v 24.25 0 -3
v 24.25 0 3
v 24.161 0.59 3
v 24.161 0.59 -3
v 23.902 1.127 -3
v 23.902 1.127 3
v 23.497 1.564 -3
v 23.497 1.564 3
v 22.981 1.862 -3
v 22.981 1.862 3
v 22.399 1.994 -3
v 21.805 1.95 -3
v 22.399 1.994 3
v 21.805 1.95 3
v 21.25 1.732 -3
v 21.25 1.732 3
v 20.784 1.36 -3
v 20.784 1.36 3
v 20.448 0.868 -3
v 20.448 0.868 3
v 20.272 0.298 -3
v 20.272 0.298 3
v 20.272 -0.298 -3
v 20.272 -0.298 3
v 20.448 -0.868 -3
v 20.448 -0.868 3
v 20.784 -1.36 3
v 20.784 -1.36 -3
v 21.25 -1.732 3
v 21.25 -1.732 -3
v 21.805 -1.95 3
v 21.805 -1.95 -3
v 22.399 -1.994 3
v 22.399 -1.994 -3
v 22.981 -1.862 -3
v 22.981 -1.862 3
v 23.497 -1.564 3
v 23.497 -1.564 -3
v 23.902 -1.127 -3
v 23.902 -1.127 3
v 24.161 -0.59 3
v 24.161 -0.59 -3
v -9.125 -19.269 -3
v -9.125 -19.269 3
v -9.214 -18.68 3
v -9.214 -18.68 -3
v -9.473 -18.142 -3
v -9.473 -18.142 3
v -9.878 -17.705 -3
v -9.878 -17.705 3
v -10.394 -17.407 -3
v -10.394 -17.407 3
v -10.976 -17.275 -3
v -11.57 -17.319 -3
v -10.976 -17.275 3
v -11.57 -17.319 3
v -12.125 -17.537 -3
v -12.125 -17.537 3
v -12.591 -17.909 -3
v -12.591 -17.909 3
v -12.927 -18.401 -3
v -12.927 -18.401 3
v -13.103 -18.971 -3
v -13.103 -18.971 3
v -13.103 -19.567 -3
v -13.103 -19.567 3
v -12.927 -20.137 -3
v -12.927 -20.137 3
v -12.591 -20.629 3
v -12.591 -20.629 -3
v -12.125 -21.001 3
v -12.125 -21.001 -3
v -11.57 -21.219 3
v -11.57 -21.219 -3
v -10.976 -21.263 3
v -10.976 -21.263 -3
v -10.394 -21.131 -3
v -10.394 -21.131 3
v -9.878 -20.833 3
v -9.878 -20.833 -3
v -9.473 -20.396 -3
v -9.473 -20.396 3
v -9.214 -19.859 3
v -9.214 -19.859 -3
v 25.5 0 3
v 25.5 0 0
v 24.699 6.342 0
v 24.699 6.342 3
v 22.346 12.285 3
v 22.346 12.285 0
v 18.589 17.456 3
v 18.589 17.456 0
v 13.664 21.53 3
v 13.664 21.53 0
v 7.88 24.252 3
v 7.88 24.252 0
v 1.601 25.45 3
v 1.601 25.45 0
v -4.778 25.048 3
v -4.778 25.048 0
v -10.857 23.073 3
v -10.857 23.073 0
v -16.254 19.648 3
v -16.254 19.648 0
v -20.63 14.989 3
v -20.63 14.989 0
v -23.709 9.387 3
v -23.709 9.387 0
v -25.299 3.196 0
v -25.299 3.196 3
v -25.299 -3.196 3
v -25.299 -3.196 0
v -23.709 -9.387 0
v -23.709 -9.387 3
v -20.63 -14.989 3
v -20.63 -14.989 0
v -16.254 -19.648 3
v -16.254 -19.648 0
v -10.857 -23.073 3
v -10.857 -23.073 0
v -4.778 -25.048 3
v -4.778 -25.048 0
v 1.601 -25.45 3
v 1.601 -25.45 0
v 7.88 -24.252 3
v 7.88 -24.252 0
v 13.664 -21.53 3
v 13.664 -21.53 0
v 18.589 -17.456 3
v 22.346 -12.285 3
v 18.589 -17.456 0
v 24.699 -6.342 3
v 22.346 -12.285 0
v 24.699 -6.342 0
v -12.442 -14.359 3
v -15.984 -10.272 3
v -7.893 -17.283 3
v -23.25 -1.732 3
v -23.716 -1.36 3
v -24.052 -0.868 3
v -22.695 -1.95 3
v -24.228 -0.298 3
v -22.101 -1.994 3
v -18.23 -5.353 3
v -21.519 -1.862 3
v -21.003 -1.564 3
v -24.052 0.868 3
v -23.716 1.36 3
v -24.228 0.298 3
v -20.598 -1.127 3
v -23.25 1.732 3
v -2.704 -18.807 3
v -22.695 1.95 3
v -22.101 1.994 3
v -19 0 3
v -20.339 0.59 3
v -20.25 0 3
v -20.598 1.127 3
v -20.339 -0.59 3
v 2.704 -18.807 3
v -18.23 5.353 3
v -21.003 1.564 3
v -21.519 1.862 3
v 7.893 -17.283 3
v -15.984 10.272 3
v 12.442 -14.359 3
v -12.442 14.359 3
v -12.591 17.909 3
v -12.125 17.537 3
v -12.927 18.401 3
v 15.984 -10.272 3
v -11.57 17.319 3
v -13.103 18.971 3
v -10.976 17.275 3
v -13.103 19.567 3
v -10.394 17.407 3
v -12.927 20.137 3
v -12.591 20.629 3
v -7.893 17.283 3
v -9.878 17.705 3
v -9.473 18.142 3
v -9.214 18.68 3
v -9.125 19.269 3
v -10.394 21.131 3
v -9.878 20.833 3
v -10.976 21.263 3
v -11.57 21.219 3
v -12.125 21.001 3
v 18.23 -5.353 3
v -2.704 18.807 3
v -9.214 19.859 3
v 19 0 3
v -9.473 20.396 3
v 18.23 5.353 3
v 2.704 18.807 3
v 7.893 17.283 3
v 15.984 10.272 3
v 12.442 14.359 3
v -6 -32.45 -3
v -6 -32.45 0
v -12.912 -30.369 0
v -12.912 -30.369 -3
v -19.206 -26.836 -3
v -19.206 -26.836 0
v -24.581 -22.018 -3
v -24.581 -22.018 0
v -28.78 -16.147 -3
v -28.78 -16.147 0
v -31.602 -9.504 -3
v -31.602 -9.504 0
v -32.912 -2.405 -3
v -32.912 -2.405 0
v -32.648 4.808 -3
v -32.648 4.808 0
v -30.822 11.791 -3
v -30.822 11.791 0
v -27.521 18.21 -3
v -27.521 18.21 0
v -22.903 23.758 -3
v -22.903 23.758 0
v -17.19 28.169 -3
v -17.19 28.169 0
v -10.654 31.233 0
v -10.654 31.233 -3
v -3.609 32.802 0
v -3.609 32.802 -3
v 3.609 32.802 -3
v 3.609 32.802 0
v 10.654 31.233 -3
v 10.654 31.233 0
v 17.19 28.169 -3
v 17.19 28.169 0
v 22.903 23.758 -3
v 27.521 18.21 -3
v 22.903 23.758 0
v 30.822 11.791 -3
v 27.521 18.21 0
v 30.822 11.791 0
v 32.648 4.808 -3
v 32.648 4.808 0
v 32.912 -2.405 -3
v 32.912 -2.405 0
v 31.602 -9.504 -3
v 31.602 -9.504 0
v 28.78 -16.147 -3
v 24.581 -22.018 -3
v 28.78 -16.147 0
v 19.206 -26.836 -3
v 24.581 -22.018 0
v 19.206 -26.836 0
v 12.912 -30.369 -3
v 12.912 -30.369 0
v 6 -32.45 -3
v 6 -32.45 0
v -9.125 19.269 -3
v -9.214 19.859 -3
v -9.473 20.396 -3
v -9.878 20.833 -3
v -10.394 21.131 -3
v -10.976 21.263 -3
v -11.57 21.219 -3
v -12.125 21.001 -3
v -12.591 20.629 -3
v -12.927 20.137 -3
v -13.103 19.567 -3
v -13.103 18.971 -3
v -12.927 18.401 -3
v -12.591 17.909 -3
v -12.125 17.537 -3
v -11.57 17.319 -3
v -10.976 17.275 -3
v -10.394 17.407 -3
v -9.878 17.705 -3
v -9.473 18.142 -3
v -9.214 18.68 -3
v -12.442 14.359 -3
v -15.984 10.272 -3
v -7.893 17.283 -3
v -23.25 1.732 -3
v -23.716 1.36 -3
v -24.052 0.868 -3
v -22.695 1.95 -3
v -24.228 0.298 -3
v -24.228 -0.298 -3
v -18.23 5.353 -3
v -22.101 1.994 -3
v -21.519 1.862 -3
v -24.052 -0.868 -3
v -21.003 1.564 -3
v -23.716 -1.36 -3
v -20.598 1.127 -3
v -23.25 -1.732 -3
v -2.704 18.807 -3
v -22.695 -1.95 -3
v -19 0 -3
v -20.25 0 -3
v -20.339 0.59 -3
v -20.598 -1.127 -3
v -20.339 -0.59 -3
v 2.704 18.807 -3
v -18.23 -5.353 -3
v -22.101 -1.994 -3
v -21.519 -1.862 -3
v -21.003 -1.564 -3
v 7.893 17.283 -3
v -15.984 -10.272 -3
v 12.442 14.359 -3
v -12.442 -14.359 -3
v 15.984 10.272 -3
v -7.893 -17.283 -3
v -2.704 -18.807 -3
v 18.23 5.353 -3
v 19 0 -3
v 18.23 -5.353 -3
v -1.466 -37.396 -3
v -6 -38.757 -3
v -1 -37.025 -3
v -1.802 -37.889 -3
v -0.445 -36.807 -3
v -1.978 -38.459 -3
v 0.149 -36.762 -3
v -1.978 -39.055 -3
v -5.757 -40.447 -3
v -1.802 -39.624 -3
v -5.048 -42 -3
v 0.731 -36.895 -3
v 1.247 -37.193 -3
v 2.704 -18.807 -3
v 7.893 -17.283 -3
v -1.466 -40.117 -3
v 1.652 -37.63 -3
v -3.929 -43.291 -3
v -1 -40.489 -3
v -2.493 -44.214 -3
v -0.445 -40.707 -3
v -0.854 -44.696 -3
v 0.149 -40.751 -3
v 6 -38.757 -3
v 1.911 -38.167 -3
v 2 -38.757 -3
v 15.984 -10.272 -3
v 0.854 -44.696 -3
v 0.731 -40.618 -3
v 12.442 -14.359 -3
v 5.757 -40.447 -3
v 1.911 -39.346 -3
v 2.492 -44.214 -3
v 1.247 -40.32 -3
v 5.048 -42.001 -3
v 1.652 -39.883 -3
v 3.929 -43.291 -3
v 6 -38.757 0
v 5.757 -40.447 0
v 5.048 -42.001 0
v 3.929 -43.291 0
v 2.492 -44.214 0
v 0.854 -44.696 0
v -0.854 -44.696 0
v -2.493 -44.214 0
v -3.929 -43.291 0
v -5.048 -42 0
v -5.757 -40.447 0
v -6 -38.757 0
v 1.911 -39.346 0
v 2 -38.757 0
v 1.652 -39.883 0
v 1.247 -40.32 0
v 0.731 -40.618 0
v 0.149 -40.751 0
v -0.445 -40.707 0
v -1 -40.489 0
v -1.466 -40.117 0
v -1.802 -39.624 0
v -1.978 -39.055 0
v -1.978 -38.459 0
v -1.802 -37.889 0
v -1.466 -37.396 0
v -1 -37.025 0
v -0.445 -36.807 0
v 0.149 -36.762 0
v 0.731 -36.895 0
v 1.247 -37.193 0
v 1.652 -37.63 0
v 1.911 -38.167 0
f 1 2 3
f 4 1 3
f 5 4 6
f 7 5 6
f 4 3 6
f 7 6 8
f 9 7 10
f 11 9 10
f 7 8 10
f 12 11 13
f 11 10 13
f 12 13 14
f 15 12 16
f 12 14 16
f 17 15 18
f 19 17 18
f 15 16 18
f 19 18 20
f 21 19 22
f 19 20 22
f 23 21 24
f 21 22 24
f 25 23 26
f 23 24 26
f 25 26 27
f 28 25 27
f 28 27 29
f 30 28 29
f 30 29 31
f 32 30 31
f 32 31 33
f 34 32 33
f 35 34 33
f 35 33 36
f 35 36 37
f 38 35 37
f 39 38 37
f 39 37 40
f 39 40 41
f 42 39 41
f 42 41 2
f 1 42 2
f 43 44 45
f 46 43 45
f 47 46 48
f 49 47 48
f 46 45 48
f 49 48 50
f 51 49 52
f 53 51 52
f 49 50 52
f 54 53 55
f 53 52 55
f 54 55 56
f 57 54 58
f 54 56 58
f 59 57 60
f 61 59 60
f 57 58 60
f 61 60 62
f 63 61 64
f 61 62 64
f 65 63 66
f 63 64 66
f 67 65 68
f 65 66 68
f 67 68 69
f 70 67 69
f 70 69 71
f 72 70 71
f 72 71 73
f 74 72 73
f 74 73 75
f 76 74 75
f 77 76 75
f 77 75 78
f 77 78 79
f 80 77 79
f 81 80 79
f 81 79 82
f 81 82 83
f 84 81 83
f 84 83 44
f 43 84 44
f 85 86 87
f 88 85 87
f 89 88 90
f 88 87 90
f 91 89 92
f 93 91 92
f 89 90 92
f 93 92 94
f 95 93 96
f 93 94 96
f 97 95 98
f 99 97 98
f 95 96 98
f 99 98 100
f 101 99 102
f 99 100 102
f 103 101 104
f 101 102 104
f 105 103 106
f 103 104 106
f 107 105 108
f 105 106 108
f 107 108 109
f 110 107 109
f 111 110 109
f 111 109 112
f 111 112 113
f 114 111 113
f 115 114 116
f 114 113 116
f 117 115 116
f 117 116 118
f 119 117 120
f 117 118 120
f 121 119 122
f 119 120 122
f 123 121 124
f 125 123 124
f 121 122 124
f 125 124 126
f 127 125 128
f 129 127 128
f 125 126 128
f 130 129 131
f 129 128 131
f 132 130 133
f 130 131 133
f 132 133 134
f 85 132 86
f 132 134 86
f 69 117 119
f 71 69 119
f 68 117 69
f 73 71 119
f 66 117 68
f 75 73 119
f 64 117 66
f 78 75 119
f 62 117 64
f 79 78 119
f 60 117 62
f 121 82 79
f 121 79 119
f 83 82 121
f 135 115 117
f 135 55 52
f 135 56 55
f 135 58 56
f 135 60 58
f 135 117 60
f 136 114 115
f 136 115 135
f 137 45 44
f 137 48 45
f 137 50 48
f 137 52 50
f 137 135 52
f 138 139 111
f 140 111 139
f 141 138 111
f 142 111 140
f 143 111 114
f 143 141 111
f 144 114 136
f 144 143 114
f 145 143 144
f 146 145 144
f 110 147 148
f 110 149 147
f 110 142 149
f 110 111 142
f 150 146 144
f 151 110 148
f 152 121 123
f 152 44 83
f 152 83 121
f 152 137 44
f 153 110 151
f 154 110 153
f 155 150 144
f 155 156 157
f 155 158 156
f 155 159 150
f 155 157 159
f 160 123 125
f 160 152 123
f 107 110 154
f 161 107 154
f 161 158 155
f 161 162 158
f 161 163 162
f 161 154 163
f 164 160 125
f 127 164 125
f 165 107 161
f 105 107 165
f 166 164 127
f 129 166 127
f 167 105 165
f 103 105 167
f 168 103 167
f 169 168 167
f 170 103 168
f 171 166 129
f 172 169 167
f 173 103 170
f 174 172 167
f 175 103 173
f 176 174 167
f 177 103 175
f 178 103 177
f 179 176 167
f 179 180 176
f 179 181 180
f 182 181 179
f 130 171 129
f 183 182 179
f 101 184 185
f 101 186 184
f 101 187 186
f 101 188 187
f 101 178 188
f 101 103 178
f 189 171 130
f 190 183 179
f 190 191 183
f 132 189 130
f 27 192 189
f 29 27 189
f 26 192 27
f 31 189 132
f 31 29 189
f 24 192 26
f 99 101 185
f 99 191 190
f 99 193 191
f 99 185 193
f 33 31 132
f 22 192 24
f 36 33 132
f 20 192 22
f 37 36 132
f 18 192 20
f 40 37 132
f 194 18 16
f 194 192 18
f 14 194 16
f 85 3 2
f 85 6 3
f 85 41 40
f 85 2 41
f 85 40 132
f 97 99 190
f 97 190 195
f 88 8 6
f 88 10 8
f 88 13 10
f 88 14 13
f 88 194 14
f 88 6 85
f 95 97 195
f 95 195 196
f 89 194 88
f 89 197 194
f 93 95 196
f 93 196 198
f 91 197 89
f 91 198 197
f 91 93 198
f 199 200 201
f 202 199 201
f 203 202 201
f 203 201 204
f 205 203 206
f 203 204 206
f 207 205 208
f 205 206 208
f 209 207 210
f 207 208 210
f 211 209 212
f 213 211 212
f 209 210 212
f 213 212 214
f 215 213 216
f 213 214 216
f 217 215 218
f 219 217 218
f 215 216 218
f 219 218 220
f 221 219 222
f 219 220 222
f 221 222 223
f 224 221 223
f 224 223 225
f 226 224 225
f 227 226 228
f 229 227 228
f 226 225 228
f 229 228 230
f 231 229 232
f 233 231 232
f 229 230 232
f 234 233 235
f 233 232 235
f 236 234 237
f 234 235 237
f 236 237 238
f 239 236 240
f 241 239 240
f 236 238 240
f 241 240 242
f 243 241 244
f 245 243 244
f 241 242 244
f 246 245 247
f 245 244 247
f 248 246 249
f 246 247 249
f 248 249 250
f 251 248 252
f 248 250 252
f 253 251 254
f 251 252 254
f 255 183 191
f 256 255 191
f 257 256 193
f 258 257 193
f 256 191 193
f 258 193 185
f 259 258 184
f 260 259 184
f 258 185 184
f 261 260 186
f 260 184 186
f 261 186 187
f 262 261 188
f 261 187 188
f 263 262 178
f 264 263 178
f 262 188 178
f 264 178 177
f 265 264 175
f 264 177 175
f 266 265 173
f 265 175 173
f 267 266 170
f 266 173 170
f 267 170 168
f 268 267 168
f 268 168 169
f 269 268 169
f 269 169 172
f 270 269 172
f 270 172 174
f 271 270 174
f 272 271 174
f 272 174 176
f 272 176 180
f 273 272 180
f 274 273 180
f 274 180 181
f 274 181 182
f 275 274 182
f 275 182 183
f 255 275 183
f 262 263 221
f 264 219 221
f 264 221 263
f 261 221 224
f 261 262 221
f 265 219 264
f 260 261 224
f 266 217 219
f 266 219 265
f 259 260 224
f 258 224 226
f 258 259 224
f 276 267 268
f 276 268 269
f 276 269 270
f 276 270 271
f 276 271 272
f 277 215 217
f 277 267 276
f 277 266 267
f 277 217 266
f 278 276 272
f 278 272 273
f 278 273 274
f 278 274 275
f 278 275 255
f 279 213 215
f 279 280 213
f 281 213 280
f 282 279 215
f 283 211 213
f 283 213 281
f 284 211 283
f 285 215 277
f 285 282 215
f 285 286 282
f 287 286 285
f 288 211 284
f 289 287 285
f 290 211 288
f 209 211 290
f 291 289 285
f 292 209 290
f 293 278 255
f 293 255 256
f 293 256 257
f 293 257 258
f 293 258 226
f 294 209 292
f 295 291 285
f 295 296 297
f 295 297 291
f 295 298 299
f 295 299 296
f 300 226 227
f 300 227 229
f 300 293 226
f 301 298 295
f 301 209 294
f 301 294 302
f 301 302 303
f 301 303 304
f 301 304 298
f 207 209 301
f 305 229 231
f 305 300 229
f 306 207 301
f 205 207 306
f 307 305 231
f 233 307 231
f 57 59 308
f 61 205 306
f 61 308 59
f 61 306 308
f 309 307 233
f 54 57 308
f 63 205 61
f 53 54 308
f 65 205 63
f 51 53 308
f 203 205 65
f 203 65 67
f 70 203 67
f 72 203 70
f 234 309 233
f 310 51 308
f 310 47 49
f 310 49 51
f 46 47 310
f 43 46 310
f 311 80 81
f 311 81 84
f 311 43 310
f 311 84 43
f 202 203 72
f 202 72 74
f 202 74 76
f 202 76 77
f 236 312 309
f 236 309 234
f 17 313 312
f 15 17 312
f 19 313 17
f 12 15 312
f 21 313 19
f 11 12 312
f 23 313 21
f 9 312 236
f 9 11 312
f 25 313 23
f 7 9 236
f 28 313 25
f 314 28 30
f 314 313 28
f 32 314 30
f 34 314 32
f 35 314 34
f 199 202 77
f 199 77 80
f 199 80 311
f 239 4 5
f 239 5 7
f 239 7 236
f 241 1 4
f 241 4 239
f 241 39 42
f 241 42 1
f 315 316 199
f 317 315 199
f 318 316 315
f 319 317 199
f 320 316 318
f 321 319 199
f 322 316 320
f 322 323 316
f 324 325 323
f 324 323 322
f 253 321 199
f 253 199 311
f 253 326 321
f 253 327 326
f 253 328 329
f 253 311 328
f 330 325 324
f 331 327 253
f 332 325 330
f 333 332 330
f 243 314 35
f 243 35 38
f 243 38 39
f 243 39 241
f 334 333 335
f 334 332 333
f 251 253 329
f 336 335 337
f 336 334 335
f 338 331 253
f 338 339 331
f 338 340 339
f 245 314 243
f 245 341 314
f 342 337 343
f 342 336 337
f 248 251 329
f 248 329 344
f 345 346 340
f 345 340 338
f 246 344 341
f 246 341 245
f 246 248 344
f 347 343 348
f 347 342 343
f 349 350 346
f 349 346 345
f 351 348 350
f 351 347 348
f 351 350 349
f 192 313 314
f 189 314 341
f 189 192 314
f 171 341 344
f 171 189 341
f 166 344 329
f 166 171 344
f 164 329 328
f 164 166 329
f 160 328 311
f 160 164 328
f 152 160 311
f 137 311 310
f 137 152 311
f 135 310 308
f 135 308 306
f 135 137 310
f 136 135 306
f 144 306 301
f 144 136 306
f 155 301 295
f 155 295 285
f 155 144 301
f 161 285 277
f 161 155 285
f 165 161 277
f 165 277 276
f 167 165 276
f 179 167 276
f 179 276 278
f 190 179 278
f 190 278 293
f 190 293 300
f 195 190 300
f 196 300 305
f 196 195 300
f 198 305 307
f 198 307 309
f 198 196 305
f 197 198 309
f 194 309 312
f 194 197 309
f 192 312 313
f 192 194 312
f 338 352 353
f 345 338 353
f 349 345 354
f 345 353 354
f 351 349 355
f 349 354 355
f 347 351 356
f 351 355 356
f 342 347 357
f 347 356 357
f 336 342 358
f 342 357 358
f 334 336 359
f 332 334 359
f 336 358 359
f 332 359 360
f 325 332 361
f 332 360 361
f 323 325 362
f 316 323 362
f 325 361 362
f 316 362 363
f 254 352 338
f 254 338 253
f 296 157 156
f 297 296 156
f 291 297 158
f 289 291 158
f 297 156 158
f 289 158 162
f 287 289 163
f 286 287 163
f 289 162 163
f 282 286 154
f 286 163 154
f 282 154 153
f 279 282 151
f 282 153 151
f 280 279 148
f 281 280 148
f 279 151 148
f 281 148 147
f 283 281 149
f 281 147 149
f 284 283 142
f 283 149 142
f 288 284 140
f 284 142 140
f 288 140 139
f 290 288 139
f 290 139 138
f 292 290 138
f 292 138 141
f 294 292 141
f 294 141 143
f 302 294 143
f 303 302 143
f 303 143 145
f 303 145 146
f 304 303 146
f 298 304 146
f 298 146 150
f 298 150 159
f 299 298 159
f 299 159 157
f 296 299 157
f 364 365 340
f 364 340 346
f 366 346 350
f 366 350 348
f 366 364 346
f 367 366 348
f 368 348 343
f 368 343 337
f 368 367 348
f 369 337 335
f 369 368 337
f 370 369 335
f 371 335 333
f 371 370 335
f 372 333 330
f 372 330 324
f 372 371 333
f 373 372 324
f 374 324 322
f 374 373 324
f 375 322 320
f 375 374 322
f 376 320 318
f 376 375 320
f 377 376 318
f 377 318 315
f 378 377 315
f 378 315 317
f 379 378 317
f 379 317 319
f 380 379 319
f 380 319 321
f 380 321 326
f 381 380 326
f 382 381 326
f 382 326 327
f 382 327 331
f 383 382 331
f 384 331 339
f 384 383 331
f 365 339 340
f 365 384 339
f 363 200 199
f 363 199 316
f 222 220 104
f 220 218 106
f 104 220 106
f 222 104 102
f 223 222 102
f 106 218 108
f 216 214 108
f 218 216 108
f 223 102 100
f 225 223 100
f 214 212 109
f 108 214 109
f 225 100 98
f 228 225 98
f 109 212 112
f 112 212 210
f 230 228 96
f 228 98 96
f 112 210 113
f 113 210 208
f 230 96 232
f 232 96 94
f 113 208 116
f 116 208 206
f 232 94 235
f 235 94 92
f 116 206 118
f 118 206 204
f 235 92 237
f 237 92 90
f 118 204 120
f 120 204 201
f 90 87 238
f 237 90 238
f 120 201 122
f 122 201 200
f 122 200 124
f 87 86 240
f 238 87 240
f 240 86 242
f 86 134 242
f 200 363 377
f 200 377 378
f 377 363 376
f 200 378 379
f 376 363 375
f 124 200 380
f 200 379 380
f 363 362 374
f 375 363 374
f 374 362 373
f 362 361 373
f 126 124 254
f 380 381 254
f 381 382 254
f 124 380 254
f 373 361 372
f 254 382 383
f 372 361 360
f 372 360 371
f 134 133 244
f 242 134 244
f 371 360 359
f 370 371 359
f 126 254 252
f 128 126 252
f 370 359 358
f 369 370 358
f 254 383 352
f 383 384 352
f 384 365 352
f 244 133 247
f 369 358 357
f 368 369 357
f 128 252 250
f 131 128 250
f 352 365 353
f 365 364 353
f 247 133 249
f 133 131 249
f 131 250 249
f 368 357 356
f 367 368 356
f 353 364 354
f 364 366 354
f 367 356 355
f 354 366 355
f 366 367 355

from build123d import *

# Parameters (mm, degrees)
SKETCH010_R     = 25.5
SKETCH010_R_2   = 19
PAD005_DEPTH    = 3
SKETCH011_R     = 19
SKETCH011_R_2   = 2
PAD006_DEPTH    = 3
SKETCH012_R     = 2
POCKET002_DEPTH = 6.001


with BuildPart() as part:
    # Sketch010 → Pad005 (new body)
    with BuildSketch(Plane.XY):
        Circle(SKETCH010_R)
        Circle(SKETCH010_R_2, mode=Mode.SUBTRACT)
    extrude(amount=PAD005_DEPTH)

    # Sketch011 (on Face3 of Pad005) → Pad006 (join)
    with BuildSketch(Plane(origin=(0, 0, 0), x_dir=(1, 0, 0), z_dir=(0, 0, -1))):
        with BuildLine():
            ThreePointArc((-6, 32.449961), (0, -33), (6, 32.449961))
            Line((6, 38.756679), (6, 32.449961))
            ThreePointArc((6, 38.756679), (-1.5e-05, 44.756648), (-6, 38.756648))
            Line((-6, 32.449961), (-6, 38.756648))
        make_face()
        Circle(SKETCH011_R, mode=Mode.SUBTRACT)
        with Locations((0, 38.756648)):
            Circle(SKETCH011_R_2, mode=Mode.SUBTRACT)
    extrude(amount=PAD006_DEPTH)

    # Sketch012 (on Face3 of Pad006) → Pocket002 (cut, through all)
    with BuildSketch(Plane.XY.offset(3)):
        with Locations((-22.25, 0)):
            Circle(SKETCH012_R)
        with Locations((22.25, 0)):
            Circle(SKETCH012_R)
        with Locations((-11.125, 19.269065)):
            Circle(SKETCH012_R)
        with Locations((-11.125, -19.269065)):
            Circle(SKETCH012_R)
    extrude(amount=-POCKET002_DEPTH, mode=Mode.SUBTRACT)


solid = part.part
